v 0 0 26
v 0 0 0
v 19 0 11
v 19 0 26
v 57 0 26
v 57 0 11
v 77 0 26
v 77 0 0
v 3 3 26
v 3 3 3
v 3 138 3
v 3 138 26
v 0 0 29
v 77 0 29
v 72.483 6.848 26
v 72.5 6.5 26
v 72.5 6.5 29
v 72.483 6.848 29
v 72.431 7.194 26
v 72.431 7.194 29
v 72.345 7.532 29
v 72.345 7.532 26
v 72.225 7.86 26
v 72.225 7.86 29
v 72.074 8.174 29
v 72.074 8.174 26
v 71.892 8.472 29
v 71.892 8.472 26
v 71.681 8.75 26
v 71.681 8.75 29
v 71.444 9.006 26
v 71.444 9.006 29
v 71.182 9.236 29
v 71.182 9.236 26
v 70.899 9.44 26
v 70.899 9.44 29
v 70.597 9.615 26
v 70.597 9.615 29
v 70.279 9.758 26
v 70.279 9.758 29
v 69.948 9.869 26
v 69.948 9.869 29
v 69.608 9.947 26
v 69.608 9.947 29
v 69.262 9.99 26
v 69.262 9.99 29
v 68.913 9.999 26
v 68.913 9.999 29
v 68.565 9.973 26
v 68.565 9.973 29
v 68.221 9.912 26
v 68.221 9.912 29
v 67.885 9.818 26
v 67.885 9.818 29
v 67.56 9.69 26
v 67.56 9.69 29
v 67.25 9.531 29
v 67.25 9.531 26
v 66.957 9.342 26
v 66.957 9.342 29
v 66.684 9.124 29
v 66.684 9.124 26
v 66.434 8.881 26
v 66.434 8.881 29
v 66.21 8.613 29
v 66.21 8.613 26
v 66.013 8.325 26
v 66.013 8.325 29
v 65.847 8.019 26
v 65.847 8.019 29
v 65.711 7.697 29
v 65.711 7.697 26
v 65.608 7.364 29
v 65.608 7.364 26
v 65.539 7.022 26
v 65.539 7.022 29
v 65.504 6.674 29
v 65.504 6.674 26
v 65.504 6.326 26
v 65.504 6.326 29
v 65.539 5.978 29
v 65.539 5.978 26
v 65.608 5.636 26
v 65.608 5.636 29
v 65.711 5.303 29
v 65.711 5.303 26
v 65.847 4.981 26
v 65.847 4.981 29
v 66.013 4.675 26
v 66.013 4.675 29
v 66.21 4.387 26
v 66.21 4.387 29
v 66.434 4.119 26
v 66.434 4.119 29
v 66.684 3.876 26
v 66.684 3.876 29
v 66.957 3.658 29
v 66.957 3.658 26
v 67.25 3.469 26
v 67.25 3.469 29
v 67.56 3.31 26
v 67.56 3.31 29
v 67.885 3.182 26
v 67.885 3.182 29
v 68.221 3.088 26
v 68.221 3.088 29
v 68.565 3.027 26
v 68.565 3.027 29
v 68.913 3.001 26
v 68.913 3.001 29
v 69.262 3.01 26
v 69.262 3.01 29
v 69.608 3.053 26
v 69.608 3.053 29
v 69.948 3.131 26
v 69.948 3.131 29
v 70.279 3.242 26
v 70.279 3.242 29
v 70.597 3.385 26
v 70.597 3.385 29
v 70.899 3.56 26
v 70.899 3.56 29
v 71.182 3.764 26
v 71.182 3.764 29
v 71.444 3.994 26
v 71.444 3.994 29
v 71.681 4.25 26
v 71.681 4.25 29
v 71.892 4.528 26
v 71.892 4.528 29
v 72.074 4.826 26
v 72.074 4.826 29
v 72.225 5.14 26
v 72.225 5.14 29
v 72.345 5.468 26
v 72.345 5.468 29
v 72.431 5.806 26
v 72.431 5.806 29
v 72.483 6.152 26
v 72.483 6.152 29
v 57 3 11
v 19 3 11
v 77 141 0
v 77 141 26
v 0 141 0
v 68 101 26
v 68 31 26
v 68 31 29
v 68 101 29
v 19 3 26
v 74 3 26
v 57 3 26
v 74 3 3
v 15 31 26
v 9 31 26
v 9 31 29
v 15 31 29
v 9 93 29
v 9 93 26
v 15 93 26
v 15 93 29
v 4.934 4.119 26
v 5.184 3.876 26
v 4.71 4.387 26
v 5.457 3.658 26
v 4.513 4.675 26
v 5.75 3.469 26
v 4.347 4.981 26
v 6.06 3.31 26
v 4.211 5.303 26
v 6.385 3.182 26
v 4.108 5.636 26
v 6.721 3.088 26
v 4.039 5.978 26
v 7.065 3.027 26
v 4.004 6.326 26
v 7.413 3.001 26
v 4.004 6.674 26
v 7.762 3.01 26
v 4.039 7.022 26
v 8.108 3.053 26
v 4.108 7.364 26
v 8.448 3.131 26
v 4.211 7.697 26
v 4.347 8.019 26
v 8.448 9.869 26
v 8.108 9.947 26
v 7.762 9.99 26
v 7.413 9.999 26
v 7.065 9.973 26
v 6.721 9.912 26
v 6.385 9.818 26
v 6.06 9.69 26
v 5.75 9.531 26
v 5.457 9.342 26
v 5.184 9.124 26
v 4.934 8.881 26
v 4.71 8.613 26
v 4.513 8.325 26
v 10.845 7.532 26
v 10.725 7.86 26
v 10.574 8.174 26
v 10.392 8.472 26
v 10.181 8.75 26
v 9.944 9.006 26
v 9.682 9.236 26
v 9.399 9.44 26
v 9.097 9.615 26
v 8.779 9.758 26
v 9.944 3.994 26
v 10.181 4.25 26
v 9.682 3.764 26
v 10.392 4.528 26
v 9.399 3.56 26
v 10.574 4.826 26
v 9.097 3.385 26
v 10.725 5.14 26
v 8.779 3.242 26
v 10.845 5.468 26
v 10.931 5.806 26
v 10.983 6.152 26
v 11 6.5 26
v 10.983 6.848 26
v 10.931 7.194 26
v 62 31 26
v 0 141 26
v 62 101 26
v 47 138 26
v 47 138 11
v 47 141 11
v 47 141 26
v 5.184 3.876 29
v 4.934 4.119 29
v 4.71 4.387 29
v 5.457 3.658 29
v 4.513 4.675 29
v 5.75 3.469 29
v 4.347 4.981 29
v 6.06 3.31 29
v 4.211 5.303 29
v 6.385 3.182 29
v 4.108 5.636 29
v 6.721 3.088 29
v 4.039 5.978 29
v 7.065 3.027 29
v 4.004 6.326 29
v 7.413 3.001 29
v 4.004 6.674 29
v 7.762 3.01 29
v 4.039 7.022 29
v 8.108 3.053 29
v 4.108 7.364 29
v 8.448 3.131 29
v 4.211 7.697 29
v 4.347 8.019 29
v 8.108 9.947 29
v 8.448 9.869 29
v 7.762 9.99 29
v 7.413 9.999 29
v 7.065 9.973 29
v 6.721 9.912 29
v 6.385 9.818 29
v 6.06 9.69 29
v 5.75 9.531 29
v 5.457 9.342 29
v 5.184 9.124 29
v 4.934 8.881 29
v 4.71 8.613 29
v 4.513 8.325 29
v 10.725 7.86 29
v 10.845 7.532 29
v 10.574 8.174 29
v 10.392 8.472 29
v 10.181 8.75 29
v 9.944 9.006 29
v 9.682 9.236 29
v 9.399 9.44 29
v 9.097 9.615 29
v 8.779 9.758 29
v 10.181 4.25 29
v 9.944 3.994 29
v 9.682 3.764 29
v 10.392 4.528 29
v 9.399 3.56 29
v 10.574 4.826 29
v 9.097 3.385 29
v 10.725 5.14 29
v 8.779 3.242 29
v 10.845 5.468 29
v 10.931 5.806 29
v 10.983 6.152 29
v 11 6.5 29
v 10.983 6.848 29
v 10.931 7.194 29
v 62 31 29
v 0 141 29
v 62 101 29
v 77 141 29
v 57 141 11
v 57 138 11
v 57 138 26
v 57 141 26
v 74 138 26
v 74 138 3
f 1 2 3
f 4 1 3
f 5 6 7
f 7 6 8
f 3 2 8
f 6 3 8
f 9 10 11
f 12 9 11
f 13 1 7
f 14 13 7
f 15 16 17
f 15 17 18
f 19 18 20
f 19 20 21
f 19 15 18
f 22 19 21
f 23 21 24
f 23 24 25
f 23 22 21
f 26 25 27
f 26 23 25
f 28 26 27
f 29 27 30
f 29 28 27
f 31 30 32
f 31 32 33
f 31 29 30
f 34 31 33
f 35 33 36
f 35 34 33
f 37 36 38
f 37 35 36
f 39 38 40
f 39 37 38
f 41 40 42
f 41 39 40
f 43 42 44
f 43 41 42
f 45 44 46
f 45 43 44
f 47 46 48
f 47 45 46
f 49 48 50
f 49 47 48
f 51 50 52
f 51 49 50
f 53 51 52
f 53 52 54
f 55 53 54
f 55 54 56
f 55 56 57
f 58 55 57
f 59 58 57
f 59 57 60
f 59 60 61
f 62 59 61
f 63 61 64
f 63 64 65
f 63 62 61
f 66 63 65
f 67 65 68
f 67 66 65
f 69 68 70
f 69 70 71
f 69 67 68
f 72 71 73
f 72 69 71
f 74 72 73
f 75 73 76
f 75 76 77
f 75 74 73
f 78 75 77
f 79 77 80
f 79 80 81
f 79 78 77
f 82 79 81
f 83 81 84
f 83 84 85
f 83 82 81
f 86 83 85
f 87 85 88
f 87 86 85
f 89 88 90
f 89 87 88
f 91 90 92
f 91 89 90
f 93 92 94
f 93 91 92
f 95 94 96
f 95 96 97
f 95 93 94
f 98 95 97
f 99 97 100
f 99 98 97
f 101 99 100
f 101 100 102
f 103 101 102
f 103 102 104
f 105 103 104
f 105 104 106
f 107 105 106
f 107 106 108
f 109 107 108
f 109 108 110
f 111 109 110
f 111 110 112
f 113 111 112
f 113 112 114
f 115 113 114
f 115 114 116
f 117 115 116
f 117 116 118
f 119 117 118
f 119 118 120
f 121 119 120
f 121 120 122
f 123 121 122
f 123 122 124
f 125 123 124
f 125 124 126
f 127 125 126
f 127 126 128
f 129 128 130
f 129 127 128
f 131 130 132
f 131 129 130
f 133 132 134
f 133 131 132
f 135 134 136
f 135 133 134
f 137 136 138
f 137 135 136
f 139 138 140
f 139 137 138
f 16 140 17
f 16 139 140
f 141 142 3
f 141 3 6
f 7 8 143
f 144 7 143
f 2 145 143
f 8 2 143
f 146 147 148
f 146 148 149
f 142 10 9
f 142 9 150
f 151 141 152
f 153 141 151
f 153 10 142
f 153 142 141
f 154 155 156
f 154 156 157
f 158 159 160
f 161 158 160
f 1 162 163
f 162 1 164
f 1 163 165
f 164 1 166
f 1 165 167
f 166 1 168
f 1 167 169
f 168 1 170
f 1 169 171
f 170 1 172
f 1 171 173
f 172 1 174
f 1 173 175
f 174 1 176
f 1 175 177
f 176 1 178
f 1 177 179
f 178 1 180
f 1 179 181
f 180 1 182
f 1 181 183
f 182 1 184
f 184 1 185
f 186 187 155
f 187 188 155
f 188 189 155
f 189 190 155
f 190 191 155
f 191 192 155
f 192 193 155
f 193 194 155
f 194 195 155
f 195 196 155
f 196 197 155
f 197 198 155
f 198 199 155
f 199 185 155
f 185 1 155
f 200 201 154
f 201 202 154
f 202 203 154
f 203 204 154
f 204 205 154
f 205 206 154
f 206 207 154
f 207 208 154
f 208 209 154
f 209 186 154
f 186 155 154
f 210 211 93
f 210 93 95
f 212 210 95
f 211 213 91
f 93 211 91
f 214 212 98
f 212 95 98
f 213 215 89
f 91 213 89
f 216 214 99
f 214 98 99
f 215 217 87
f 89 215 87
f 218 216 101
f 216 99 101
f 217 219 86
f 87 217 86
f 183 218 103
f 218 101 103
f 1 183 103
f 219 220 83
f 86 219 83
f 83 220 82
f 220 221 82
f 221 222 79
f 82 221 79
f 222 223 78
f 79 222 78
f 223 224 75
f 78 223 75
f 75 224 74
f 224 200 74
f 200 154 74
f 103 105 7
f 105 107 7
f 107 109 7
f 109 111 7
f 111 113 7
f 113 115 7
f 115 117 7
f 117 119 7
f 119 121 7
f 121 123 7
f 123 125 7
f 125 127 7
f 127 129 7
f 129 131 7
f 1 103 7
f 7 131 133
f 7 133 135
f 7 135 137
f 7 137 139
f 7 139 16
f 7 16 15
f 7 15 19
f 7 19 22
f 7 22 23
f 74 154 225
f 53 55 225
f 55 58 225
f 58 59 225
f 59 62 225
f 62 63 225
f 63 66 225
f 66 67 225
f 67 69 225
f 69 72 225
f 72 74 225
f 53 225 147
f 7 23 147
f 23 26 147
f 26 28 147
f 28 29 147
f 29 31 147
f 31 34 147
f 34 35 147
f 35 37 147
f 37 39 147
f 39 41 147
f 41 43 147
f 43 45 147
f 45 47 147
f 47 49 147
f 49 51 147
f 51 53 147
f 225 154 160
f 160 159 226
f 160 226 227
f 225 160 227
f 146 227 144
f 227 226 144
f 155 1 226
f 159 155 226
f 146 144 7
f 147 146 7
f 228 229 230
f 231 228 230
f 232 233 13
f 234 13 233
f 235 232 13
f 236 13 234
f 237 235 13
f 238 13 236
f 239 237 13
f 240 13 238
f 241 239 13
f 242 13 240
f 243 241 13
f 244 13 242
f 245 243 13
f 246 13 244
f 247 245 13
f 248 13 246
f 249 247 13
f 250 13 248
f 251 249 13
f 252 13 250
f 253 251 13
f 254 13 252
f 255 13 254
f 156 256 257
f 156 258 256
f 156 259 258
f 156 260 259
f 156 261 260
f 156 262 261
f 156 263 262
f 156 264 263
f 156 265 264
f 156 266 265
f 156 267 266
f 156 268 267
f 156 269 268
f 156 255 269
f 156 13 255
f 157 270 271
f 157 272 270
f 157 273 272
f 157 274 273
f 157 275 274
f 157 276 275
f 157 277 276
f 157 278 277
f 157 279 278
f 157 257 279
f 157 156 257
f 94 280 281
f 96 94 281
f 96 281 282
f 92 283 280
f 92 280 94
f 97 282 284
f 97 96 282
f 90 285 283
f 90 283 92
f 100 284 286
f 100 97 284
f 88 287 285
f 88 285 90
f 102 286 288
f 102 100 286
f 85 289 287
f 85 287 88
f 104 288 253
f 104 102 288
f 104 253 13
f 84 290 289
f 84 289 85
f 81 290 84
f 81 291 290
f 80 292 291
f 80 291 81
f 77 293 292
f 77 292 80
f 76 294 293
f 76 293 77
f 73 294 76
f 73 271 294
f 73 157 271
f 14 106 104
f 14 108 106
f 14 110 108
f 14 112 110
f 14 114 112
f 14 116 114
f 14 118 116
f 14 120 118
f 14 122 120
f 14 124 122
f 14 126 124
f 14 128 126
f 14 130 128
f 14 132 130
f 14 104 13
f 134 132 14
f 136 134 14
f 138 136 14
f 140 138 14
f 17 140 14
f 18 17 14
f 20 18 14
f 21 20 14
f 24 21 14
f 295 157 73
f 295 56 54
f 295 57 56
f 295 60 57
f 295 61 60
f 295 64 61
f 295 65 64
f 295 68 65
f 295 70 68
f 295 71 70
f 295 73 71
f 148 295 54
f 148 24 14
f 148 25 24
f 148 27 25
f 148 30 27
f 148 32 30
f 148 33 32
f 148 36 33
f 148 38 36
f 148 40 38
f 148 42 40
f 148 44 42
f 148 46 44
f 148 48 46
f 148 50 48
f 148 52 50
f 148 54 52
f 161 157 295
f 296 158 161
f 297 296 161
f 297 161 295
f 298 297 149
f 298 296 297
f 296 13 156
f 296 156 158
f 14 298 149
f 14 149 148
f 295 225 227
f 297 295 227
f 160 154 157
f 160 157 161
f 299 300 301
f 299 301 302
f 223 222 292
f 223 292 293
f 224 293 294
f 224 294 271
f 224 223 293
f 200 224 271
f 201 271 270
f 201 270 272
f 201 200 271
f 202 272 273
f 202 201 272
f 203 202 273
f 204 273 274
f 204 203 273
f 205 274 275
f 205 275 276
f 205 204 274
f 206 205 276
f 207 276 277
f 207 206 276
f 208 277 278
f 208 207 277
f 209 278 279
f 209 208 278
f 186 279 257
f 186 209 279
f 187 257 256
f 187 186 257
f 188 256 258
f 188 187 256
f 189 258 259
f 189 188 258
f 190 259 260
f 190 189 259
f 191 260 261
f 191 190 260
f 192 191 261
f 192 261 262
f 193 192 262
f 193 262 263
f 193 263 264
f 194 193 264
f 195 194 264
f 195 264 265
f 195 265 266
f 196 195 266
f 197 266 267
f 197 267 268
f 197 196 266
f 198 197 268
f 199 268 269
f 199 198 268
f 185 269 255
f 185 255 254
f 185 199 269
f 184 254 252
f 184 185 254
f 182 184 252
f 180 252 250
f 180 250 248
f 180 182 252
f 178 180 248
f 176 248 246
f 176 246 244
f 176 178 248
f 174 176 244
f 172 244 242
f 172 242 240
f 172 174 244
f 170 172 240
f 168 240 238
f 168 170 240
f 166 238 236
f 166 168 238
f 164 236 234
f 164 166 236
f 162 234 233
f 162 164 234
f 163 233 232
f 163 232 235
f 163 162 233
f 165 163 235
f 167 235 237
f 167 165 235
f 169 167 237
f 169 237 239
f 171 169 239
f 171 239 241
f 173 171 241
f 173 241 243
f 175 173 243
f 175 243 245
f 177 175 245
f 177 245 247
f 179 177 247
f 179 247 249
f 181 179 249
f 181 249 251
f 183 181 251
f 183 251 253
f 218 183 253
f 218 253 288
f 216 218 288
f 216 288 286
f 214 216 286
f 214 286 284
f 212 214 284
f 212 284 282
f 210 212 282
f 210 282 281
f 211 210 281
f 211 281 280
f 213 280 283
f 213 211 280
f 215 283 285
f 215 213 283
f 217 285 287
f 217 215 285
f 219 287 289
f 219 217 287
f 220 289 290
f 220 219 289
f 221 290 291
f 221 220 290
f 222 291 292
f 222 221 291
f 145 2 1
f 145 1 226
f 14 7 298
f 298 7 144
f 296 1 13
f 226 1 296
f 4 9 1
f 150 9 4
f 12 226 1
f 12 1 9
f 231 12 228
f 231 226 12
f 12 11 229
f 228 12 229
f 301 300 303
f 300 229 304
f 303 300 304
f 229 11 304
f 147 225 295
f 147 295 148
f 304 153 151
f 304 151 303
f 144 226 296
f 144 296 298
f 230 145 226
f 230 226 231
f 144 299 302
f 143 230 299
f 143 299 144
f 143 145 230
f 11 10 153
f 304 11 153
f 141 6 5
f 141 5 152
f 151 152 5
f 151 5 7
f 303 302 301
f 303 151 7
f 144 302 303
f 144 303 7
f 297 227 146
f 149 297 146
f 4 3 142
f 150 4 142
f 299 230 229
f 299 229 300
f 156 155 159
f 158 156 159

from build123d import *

# Parameters (mm, degrees)
BOX004_W          = 10
BOX004_H          = 3
BOX004_DEPTH      = 15
BOX003_W          = 38
BOX003_H          = 3
BOX003_DEPTH      = 15
BOX002_W          = 77
BOX002_H          = 141
BOX002_DEPTH      = 3
BOX001_W          = 71
BOX001_H          = 135
BOX001_DEPTH      = 23
BOX_W             = 77
BOX_H             = 141
BOX_DEPTH         = 23
BOX007_W          = 6
BOX007_H          = 70
BOX007_DEPTH      = 3
BOX006_W          = 6
BOX006_H          = 62
BOX006_DEPTH      = 3
CYLINDER001_R     = 3.5
CYLINDER001_DEPTH = 3
CYLINDER_R        = 3.5
CYLINDER_DEPTH    = 3
BOX005_W          = 77
BOX005_H          = 141
BOX005_DEPTH      = 3


with BuildPart() as box004:
    # Box004 → Box004 (new body)
    with BuildSketch(Plane(origin=(47, 138, 11), x_dir=(1, 0, 0), z_dir=(0, 0, 1))):
        with Locations((5, 1.5)):
            Rectangle(BOX004_W, BOX004_H)
    extrude(amount=BOX004_DEPTH)


with BuildPart() as box003:
    # Box003 → Box003 (new body)
    with BuildSketch(Plane(origin=(19, 0, 11), x_dir=(1, 0, 0), z_dir=(0, 0, 1))):
        with Locations((19, 1.5)):
            Rectangle(BOX003_W, BOX003_H)
    extrude(amount=BOX003_DEPTH)


with BuildPart() as box002:
    # Box002 → Box002 (new body)
    with BuildSketch(Plane.XY):
        with Locations((38.5, 70.5)):
            Rectangle(BOX002_W, BOX002_H)
    extrude(amount=BOX002_DEPTH)


with BuildPart() as b:
    # Box001 → Box001 (new body)
    with BuildSketch(Plane(origin=(3, 3, 0), x_dir=(1, 0, 0), z_dir=(0, 0, 1))):
        with Locations((35.5, 67.5)):
            Rectangle(BOX001_W, BOX001_H)
    extrude(amount=BOX001_DEPTH)


with BuildPart() as carcasa:
    # Box → Box (new body)
    with BuildSketch(Plane.XY):
        with Locations((38.5, 70.5)):
            Rectangle(BOX_W, BOX_H)
    extrude(amount=BOX_DEPTH)

    # Cut: cut b
    add(b.part, mode=Mode.SUBTRACT)


with BuildPart() as carcasa_1:
    # Cut placement: moved
    add(carcasa.part.moved(Location((0, 0, 3))))

    # Fusion: union Box002
    add(box002.part)

    # Cut001: cut Box003
    add(box003.part, mode=Mode.SUBTRACT)

    # Cut002: cut Box004
    add(box004.part, mode=Mode.SUBTRACT)


with BuildPart() as rejilla2:
    # Box007 → Box007 (new body)
    with BuildSketch(Plane(origin=(62, 31, 26), x_dir=(1, 0, 0), z_dir=(0, 0, 1))):
        with Locations((3, 35)):
            Rectangle(BOX007_W, BOX007_H)
    extrude(amount=BOX007_DEPTH)


with BuildPart() as rejillas:
    # Box006 → Box006 (new body)
    with BuildSketch(Plane(origin=(9, 31, 26), x_dir=(1, 0, 0), z_dir=(0, 0, 1))):
        with Locations((3, 31)):
            Rectangle(BOX006_W, BOX006_H)
    extrude(amount=BOX006_DEPTH)

    # Fusion002: union rejilla2
    add(rejilla2.part)


with BuildPart() as switch2:
    # Cylinder001 → Cylinder001 (new body)
    with BuildSketch(Plane(origin=(69, 5.5, 26), x_dir=(1, 0, 0), z_dir=(0, 0, 1))):
        Circle(CYLINDER001_R)
    extrude(amount=CYLINDER001_DEPTH)


with BuildPart() as switches:
    # Cylinder → Cylinder (new body)
    with BuildSketch(Plane(origin=(7.5, 5.5, 26), x_dir=(1, 0, 0), z_dir=(0, 0, 1))):
        Circle(CYLINDER_R)
    extrude(amount=CYLINDER_DEPTH)

    # Fusion001: union switch2
    add(switch2.part)


with BuildPart() as switches_1:
    # Fusion001 placement: moved
    add(switches.part.moved(Location((0, 1, 0))))


with BuildPart() as tapa:
    # Box005 → Box005 (new body)
    with BuildSketch(Plane.XY.offset(26)):
        with Locations((38.5, 70.5)):
            Rectangle(BOX005_W, BOX005_H)
    extrude(amount=BOX005_DEPTH)

    # Cut003: cut switches
    add(switches_1.part, mode=Mode.SUBTRACT)

    # Cut004: cut rejillas
    add(rejillas.part, mode=Mode.SUBTRACT)


solid = Compound([carcasa_1.part, tapa.part])
